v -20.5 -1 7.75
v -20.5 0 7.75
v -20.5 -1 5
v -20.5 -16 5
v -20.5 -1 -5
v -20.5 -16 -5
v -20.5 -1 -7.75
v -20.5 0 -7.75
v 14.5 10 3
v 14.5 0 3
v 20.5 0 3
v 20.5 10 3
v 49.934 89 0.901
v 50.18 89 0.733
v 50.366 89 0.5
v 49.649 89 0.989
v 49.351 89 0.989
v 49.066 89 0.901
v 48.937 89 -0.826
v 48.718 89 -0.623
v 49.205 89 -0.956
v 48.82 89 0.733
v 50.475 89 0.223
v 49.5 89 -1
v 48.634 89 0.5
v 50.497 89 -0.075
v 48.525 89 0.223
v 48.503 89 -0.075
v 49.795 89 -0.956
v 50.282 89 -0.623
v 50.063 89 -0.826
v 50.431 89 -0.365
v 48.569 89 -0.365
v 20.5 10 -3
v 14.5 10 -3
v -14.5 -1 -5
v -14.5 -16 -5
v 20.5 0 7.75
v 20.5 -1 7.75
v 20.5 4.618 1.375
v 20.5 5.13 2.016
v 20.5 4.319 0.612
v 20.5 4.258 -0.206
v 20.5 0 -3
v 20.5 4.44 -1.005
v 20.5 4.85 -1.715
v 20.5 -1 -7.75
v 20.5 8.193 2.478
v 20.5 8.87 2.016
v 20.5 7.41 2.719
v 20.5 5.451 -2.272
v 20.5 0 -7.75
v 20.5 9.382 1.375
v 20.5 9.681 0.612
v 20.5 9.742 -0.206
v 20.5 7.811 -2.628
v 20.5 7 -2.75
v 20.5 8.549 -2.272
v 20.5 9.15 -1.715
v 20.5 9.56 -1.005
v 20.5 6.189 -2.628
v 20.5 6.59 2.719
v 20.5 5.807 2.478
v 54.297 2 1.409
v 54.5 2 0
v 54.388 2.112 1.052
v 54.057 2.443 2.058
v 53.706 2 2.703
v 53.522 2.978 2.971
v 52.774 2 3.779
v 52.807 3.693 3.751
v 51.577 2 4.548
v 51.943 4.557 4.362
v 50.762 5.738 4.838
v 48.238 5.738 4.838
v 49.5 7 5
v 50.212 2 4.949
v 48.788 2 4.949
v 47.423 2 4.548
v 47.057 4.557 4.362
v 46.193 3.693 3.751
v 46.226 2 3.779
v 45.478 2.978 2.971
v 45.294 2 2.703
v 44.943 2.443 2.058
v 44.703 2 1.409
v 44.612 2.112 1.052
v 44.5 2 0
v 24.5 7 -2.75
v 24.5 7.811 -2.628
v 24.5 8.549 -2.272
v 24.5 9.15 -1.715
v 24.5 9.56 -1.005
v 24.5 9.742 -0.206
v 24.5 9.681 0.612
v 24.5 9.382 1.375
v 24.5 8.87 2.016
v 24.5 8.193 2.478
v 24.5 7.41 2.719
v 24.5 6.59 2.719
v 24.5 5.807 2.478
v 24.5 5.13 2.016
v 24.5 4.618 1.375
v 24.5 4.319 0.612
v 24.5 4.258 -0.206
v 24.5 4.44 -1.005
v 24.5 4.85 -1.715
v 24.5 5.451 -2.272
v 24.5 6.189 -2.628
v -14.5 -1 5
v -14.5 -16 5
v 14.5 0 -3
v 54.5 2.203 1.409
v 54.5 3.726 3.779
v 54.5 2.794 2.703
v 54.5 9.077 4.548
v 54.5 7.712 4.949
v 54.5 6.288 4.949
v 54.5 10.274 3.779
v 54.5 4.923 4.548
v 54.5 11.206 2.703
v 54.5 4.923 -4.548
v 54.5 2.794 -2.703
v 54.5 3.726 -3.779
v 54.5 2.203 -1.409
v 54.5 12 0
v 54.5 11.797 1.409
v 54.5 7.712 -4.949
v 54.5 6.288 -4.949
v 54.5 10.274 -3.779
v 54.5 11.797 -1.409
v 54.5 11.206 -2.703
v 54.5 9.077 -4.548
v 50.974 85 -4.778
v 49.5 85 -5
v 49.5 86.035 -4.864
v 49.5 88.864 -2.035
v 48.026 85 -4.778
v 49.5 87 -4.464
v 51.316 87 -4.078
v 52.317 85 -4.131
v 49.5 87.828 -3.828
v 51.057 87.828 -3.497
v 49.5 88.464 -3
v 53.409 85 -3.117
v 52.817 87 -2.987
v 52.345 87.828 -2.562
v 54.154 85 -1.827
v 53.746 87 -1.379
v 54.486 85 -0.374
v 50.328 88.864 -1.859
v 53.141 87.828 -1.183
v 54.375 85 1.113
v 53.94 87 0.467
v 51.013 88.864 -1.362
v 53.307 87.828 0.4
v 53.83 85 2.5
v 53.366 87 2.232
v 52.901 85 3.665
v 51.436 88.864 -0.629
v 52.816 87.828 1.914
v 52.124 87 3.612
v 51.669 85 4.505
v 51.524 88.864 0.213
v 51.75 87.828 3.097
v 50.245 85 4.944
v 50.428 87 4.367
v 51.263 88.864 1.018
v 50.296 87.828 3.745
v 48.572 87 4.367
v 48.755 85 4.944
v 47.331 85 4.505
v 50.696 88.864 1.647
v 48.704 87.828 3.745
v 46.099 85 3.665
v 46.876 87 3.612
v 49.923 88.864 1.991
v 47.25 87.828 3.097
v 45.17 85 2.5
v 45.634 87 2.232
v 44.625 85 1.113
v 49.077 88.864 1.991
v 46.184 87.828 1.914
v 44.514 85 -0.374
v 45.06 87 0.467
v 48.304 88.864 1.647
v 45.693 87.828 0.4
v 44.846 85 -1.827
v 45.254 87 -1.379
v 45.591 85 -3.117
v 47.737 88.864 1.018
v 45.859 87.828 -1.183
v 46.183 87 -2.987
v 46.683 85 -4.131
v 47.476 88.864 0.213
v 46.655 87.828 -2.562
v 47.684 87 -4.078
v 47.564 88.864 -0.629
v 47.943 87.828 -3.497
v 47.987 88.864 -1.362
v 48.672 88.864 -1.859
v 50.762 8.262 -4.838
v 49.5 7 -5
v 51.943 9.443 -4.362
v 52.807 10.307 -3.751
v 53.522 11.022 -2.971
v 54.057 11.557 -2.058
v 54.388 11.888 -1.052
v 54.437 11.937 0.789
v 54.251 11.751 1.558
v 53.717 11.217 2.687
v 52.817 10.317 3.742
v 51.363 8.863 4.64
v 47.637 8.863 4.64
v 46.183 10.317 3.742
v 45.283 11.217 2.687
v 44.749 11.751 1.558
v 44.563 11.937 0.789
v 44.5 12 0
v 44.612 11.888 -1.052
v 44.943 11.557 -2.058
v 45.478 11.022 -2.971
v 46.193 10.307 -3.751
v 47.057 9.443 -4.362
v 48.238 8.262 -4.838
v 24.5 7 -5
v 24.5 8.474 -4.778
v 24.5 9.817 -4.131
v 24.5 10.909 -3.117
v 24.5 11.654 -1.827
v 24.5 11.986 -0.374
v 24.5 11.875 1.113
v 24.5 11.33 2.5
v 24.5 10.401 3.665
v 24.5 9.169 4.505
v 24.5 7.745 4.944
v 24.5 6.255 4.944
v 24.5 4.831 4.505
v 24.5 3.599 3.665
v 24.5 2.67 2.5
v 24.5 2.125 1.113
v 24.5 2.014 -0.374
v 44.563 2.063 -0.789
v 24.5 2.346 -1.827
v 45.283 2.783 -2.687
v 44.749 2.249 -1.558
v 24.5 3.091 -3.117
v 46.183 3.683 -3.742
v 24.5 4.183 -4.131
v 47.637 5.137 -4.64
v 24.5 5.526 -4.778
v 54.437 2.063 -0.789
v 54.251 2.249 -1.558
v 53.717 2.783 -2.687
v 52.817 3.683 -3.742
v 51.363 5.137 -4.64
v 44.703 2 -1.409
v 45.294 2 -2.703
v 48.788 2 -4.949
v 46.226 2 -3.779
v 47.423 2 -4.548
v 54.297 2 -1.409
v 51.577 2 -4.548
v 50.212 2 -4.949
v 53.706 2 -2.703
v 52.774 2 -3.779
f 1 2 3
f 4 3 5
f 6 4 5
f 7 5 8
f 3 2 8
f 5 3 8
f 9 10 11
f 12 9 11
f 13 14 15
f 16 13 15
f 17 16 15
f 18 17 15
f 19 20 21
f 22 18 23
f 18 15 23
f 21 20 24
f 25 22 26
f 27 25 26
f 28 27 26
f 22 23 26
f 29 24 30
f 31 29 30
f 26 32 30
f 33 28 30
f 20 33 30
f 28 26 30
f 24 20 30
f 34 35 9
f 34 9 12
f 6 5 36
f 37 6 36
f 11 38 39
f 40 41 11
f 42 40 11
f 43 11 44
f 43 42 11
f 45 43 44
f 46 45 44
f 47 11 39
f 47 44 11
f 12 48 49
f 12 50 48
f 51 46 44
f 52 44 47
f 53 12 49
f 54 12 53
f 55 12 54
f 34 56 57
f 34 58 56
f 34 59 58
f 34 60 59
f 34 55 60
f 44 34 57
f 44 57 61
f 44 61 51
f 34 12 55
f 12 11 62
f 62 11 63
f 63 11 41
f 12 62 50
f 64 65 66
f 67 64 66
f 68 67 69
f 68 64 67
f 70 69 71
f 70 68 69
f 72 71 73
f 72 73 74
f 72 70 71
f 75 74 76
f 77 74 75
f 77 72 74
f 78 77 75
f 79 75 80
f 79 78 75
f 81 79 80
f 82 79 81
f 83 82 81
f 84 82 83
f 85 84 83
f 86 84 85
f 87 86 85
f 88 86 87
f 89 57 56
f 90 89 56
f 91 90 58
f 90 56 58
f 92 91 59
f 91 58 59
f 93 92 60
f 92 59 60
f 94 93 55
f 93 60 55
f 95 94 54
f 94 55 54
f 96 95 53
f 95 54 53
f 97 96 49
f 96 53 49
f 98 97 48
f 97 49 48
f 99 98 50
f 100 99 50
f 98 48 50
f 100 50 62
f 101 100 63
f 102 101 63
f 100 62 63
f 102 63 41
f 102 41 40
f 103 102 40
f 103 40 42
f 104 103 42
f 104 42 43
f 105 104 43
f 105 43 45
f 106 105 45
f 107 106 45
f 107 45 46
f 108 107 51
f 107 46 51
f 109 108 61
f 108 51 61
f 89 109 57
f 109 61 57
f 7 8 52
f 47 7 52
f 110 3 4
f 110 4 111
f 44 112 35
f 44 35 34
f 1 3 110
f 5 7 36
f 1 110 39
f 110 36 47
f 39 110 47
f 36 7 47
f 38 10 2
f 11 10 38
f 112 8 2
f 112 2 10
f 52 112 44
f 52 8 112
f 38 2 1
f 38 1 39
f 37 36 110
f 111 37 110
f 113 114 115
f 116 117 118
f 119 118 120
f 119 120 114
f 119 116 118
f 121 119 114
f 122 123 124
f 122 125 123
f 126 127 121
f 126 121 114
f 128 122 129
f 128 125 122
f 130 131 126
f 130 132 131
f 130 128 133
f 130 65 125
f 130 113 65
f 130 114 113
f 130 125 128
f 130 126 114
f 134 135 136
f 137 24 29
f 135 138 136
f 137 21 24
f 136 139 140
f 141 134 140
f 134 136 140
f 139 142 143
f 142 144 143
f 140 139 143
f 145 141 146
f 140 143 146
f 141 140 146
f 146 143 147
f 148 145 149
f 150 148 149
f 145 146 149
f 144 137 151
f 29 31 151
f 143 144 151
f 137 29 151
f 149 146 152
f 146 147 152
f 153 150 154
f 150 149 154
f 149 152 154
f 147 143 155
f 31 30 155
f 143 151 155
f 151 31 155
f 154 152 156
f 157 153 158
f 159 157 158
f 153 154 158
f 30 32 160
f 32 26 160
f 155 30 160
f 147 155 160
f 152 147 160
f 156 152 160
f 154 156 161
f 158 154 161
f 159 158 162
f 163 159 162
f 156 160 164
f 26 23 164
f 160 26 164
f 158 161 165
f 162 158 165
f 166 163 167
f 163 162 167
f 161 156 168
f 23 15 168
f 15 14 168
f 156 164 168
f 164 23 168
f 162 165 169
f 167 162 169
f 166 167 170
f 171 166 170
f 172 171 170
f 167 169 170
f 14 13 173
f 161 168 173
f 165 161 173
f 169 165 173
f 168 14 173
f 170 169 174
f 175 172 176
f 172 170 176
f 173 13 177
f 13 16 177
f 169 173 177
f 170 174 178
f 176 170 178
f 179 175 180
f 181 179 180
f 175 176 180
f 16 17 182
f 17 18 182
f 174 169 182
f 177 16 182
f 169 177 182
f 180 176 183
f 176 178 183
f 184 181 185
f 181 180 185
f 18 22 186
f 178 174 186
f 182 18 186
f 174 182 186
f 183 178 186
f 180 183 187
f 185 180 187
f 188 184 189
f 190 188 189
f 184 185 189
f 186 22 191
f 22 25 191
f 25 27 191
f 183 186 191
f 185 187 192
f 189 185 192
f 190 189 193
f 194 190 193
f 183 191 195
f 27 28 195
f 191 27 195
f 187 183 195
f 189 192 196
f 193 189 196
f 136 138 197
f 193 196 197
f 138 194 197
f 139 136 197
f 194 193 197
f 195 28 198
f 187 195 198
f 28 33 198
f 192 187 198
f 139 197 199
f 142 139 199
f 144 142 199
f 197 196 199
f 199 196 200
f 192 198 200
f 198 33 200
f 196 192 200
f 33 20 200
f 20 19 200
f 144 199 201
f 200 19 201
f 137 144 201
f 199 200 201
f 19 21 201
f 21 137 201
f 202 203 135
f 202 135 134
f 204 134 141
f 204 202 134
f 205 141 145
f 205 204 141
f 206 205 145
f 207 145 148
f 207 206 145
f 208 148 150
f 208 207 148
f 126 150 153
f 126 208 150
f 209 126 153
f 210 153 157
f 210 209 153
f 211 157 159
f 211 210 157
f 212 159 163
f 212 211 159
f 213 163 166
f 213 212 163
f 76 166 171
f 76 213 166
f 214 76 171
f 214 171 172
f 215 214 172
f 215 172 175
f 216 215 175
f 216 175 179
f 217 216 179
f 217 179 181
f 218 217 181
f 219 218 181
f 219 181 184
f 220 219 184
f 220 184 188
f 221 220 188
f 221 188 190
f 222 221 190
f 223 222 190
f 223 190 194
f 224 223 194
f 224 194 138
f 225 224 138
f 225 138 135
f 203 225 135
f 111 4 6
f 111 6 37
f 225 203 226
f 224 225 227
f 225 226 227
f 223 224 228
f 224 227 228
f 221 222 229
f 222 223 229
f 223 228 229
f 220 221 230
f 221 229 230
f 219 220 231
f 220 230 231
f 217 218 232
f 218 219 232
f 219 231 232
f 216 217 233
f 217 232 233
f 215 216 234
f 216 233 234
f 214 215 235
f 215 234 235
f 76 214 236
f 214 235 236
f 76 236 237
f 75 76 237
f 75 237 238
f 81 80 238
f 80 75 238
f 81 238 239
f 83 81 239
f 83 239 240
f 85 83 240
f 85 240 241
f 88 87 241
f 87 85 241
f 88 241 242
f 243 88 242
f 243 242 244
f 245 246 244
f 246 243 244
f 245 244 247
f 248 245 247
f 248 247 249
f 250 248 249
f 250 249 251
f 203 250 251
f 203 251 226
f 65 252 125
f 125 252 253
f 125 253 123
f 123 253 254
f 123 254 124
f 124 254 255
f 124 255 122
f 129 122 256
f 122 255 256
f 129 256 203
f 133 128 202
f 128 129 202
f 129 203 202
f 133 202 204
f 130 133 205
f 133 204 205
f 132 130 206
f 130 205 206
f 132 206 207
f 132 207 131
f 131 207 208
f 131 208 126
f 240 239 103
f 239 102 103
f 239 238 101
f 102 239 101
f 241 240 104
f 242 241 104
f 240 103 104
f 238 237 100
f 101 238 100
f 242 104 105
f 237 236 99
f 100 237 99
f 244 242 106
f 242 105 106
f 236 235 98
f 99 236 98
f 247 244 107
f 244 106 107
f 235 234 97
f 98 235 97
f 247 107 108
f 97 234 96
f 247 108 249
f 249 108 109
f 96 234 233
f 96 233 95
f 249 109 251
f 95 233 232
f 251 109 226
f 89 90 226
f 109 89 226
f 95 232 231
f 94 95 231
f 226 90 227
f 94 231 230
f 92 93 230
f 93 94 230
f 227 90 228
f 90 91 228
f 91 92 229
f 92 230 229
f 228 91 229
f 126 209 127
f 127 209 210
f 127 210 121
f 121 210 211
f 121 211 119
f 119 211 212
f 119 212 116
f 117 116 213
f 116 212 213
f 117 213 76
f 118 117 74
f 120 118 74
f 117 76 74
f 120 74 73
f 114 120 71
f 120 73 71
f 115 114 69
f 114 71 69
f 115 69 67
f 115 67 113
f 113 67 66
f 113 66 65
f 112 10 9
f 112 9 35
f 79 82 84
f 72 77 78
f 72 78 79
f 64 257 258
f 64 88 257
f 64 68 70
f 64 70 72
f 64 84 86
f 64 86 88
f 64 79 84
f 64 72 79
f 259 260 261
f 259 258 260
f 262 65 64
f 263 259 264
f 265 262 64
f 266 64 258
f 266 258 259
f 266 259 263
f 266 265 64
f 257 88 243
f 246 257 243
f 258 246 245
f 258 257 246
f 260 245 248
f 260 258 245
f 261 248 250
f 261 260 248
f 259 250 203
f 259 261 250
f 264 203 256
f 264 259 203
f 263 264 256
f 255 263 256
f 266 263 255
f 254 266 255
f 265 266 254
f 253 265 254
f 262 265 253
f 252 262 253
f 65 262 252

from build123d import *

# Parameters (mm, degrees)
SKETCH_1_W             = 41
SKETCH_1_H             = 15.5
SM_BASE_FLANGE_1_DEPTH = 1
SKETCH_6_W             = 6
SKETCH_6_H             = 6
EXTRUDE_1_DEPTH        = 10
SKETCH_7_R             = 2.75
EXTRUDE_2_DEPTH        = 4
SKETCH_8_R             = 5
EXTRUDE_3_DEPTH        = 30
SKETCH_9_R             = 5
EXTRUDE_4_DEPTH        = 87
FILLET_1_R             = 4
SKETCH_10_W            = 6
SKETCH_10_H            = 10
EXTRUDE_5_DEPTH        = 15


# Sheet-metal steps are written as plain solids
with BuildPart() as part:
    # Sketch 1 → Базовая кромка1 (new body)
    with BuildSketch(Plane(origin=(0, 0, 0), x_dir=(1, 0, 0), z_dir=(0, 1, 0))):
        Rectangle(SKETCH_1_W, SKETCH_1_H)
    extrude(amount=-SM_BASE_FLANGE_1_DEPTH)

    # Эскиз6 → Бобышка-Вытянуть1 (add)
    with BuildSketch(Plane(origin=(0, 0, 0), x_dir=(1, 0, 0), z_dir=(0, 1, 0))):
        with Locations((17.5, 0)):
            Rectangle(SKETCH_6_W, SKETCH_6_H)
    extrude(amount=EXTRUDE_1_DEPTH)

    # Эскиз7 → Бобышка-Вытянуть2 (add)
    with BuildSketch(Plane(origin=(20.5, 0, 0), x_dir=(0, 0, -1), z_dir=(1, 0, 0))):
        with Locations((0, 7)):
            Circle(SKETCH_7_R)
    extrude(amount=EXTRUDE_2_DEPTH)

    # Эскиз8 → Бобышка-Вытянуть3 (add)
    with BuildSketch(Plane(origin=(24.5, 0, 0), x_dir=(0, 0, -1), z_dir=(1, 0, 0))):
        with Locations((0, 7)):
            Circle(SKETCH_8_R)
    extrude(amount=EXTRUDE_3_DEPTH)

    # Эскиз9 → Бобышка-Вытянуть4 (add)
    with BuildSketch(Plane(origin=(0, 2, 0), x_dir=(-1, 0, 0), z_dir=(0, -1, 0))):
        with Locations(Location((-49.5, 0, 0), (0, 0, 90))):
            Circle(SKETCH_9_R)
    extrude(amount=-EXTRUDE_4_DEPTH)

    # Скругление1
    fillet_1_edges = [part.edges().sort_by_distance(p)[0] for p in [
        (49.5, 89, 5),
    ]]
    fillet(fillet_1_edges, radius=FILLET_1_R)

    # Эскиз10 → Бобышка-Вытянуть5 (add)
    with BuildSketch(Plane.XZ.offset(1)):
        with Locations((-17.5, 0)):
            Rectangle(SKETCH_10_W, SKETCH_10_H)
    extrude(amount=EXTRUDE_5_DEPTH)


solid = part.part
